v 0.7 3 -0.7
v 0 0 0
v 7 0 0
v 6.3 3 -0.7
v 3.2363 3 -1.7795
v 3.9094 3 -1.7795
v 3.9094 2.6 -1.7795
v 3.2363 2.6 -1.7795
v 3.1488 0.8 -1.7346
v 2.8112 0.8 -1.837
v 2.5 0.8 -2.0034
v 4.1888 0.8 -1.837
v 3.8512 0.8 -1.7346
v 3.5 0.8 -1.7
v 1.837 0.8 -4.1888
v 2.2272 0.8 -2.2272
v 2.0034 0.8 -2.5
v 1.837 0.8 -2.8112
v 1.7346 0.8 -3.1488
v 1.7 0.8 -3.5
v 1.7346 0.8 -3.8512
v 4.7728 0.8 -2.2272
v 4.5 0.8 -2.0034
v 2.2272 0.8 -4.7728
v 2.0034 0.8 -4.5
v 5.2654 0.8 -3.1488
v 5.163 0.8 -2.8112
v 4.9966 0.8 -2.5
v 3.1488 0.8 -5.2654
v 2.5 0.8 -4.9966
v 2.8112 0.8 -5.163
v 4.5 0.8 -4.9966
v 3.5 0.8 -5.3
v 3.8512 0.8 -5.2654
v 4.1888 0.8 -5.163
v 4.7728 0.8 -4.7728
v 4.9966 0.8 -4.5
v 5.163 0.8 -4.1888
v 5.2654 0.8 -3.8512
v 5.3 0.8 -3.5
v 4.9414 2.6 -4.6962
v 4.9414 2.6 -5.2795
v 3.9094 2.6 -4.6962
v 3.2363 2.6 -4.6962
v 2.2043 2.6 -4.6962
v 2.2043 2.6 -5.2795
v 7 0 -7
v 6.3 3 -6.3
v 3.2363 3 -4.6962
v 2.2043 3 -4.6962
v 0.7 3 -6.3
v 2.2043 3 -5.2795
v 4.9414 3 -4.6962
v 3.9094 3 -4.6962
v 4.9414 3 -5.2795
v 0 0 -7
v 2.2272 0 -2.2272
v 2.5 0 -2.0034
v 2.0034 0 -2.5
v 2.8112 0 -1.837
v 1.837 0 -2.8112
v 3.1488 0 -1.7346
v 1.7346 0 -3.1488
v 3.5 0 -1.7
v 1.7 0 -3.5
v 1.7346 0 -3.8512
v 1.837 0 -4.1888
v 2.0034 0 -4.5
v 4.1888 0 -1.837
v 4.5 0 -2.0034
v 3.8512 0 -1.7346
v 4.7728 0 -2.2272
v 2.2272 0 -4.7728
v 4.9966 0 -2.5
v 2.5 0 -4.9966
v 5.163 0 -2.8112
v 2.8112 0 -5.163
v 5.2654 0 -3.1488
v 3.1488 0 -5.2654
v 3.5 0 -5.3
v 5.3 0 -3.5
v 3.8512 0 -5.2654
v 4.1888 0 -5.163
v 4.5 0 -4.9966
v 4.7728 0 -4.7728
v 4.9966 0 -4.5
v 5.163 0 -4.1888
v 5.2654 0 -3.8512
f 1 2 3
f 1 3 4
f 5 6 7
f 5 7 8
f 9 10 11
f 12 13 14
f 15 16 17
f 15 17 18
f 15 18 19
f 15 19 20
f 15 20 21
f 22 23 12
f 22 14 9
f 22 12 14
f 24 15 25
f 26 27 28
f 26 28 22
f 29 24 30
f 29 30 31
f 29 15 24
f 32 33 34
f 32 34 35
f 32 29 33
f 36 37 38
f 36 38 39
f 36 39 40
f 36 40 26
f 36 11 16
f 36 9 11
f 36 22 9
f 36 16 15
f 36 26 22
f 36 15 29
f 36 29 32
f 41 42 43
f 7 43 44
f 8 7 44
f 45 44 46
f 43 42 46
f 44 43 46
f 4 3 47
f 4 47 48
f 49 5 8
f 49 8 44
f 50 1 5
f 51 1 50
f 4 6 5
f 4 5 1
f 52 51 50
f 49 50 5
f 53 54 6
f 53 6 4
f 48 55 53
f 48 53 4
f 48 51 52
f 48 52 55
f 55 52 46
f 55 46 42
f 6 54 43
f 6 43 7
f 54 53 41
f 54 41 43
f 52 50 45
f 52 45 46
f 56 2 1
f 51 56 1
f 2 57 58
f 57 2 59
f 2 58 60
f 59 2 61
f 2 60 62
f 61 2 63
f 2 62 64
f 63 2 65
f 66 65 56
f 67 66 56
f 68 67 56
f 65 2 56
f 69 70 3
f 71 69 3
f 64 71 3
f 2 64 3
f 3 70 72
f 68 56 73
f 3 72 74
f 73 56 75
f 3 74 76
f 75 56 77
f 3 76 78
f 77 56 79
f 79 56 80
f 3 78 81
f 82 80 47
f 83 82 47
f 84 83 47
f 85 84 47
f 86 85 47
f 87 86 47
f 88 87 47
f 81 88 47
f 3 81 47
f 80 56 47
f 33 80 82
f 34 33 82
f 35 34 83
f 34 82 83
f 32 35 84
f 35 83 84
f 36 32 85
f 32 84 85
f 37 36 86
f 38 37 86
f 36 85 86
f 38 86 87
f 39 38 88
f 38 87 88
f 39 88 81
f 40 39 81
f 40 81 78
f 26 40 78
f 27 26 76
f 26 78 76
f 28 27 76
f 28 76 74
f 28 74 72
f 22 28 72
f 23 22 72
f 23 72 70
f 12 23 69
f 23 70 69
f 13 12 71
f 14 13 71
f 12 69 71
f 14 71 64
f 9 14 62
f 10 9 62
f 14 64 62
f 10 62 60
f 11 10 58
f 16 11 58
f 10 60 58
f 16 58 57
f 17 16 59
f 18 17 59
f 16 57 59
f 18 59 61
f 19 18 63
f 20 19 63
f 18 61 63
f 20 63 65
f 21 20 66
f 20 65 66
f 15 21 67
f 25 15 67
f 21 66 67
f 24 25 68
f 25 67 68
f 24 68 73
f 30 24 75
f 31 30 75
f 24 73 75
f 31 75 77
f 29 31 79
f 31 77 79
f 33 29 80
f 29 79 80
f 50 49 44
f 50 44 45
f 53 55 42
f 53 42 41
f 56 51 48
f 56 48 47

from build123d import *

# Parameters (mm, degrees)
SKETCH1_W           = 7
SKETCH1_H           = 7
BOSS_EXTRUDE1_DEPTH = 3
CUT_EXTRUDE1_DEPTH  = 7
CUT_EXTRUDE2_DEPTH  = 11
SKETCH4_R           = 1.8
CUT_EXTRUDE3_DEPTH  = 0.8
CUT_EXTRUDE4_DEPTH  = 0.4


with BuildPart() as part:
    # Sketch1 → Boss-Extrude1 (new body)
    with BuildSketch(Plane(origin=(0, 0, 0), x_dir=(1, 0, 0), z_dir=(0, 1, 0))):
        with Locations((3.5, 3.5)):
            Rectangle(SKETCH1_W, SKETCH1_H)
    extrude(amount=BOSS_EXTRUDE1_DEPTH)

    # Sketch2 → Cut-Extrude1 (cut)
    with BuildSketch(Plane.XY):
        Polygon((0, 0), (0.7, 3), (0, 3), align=None)
        Polygon((7, 0), (6.3, 3), (7, 3), align=None)
    extrude(amount=-CUT_EXTRUDE1_DEPTH, mode=Mode.SUBTRACT)

    # Sketch3 → Cut-Extrude2 (cut)
    with BuildSketch(Plane(origin=(0, 0, 0), x_dir=(0, 0, -1), z_dir=(1, 0, 0))):
        Polygon((0, 0), (0.7, 3), (0, 3), align=None)
        Polygon((7, 3), (6.3, 3), (7, 0), align=None)
    extrude(amount=CUT_EXTRUDE2_DEPTH, mode=Mode.SUBTRACT)

    # Sketch4 → Cut-Extrude3 (cut)
    with BuildSketch(Plane.XZ):
        with Locations(Location((3.5, -3.5, 0), (0, 0, 270))):
            Circle(SKETCH4_R)
    extrude(amount=-CUT_EXTRUDE3_DEPTH, mode=Mode.SUBTRACT)

    # Sketch5 → Cut-Extrude4 (cut)
    with BuildSketch(Plane(origin=(0, 3, 0), x_dir=(1, 0, 0), z_dir=(0, 1, 0))):
        Polygon((3.236309529, 1.779523254), (3.236309529, 4.696189921), (2.204258247, 4.696189921), (2.204258247, 5.279523254), (4.941437734, 5.279523254), (4.941437734, 4.696189921), (3.909386452, 4.696189921), (3.909386452, 1.779523254), align=None)
    extrude(amount=-CUT_EXTRUDE4_DEPTH, mode=Mode.SUBTRACT)


solid = part.part
